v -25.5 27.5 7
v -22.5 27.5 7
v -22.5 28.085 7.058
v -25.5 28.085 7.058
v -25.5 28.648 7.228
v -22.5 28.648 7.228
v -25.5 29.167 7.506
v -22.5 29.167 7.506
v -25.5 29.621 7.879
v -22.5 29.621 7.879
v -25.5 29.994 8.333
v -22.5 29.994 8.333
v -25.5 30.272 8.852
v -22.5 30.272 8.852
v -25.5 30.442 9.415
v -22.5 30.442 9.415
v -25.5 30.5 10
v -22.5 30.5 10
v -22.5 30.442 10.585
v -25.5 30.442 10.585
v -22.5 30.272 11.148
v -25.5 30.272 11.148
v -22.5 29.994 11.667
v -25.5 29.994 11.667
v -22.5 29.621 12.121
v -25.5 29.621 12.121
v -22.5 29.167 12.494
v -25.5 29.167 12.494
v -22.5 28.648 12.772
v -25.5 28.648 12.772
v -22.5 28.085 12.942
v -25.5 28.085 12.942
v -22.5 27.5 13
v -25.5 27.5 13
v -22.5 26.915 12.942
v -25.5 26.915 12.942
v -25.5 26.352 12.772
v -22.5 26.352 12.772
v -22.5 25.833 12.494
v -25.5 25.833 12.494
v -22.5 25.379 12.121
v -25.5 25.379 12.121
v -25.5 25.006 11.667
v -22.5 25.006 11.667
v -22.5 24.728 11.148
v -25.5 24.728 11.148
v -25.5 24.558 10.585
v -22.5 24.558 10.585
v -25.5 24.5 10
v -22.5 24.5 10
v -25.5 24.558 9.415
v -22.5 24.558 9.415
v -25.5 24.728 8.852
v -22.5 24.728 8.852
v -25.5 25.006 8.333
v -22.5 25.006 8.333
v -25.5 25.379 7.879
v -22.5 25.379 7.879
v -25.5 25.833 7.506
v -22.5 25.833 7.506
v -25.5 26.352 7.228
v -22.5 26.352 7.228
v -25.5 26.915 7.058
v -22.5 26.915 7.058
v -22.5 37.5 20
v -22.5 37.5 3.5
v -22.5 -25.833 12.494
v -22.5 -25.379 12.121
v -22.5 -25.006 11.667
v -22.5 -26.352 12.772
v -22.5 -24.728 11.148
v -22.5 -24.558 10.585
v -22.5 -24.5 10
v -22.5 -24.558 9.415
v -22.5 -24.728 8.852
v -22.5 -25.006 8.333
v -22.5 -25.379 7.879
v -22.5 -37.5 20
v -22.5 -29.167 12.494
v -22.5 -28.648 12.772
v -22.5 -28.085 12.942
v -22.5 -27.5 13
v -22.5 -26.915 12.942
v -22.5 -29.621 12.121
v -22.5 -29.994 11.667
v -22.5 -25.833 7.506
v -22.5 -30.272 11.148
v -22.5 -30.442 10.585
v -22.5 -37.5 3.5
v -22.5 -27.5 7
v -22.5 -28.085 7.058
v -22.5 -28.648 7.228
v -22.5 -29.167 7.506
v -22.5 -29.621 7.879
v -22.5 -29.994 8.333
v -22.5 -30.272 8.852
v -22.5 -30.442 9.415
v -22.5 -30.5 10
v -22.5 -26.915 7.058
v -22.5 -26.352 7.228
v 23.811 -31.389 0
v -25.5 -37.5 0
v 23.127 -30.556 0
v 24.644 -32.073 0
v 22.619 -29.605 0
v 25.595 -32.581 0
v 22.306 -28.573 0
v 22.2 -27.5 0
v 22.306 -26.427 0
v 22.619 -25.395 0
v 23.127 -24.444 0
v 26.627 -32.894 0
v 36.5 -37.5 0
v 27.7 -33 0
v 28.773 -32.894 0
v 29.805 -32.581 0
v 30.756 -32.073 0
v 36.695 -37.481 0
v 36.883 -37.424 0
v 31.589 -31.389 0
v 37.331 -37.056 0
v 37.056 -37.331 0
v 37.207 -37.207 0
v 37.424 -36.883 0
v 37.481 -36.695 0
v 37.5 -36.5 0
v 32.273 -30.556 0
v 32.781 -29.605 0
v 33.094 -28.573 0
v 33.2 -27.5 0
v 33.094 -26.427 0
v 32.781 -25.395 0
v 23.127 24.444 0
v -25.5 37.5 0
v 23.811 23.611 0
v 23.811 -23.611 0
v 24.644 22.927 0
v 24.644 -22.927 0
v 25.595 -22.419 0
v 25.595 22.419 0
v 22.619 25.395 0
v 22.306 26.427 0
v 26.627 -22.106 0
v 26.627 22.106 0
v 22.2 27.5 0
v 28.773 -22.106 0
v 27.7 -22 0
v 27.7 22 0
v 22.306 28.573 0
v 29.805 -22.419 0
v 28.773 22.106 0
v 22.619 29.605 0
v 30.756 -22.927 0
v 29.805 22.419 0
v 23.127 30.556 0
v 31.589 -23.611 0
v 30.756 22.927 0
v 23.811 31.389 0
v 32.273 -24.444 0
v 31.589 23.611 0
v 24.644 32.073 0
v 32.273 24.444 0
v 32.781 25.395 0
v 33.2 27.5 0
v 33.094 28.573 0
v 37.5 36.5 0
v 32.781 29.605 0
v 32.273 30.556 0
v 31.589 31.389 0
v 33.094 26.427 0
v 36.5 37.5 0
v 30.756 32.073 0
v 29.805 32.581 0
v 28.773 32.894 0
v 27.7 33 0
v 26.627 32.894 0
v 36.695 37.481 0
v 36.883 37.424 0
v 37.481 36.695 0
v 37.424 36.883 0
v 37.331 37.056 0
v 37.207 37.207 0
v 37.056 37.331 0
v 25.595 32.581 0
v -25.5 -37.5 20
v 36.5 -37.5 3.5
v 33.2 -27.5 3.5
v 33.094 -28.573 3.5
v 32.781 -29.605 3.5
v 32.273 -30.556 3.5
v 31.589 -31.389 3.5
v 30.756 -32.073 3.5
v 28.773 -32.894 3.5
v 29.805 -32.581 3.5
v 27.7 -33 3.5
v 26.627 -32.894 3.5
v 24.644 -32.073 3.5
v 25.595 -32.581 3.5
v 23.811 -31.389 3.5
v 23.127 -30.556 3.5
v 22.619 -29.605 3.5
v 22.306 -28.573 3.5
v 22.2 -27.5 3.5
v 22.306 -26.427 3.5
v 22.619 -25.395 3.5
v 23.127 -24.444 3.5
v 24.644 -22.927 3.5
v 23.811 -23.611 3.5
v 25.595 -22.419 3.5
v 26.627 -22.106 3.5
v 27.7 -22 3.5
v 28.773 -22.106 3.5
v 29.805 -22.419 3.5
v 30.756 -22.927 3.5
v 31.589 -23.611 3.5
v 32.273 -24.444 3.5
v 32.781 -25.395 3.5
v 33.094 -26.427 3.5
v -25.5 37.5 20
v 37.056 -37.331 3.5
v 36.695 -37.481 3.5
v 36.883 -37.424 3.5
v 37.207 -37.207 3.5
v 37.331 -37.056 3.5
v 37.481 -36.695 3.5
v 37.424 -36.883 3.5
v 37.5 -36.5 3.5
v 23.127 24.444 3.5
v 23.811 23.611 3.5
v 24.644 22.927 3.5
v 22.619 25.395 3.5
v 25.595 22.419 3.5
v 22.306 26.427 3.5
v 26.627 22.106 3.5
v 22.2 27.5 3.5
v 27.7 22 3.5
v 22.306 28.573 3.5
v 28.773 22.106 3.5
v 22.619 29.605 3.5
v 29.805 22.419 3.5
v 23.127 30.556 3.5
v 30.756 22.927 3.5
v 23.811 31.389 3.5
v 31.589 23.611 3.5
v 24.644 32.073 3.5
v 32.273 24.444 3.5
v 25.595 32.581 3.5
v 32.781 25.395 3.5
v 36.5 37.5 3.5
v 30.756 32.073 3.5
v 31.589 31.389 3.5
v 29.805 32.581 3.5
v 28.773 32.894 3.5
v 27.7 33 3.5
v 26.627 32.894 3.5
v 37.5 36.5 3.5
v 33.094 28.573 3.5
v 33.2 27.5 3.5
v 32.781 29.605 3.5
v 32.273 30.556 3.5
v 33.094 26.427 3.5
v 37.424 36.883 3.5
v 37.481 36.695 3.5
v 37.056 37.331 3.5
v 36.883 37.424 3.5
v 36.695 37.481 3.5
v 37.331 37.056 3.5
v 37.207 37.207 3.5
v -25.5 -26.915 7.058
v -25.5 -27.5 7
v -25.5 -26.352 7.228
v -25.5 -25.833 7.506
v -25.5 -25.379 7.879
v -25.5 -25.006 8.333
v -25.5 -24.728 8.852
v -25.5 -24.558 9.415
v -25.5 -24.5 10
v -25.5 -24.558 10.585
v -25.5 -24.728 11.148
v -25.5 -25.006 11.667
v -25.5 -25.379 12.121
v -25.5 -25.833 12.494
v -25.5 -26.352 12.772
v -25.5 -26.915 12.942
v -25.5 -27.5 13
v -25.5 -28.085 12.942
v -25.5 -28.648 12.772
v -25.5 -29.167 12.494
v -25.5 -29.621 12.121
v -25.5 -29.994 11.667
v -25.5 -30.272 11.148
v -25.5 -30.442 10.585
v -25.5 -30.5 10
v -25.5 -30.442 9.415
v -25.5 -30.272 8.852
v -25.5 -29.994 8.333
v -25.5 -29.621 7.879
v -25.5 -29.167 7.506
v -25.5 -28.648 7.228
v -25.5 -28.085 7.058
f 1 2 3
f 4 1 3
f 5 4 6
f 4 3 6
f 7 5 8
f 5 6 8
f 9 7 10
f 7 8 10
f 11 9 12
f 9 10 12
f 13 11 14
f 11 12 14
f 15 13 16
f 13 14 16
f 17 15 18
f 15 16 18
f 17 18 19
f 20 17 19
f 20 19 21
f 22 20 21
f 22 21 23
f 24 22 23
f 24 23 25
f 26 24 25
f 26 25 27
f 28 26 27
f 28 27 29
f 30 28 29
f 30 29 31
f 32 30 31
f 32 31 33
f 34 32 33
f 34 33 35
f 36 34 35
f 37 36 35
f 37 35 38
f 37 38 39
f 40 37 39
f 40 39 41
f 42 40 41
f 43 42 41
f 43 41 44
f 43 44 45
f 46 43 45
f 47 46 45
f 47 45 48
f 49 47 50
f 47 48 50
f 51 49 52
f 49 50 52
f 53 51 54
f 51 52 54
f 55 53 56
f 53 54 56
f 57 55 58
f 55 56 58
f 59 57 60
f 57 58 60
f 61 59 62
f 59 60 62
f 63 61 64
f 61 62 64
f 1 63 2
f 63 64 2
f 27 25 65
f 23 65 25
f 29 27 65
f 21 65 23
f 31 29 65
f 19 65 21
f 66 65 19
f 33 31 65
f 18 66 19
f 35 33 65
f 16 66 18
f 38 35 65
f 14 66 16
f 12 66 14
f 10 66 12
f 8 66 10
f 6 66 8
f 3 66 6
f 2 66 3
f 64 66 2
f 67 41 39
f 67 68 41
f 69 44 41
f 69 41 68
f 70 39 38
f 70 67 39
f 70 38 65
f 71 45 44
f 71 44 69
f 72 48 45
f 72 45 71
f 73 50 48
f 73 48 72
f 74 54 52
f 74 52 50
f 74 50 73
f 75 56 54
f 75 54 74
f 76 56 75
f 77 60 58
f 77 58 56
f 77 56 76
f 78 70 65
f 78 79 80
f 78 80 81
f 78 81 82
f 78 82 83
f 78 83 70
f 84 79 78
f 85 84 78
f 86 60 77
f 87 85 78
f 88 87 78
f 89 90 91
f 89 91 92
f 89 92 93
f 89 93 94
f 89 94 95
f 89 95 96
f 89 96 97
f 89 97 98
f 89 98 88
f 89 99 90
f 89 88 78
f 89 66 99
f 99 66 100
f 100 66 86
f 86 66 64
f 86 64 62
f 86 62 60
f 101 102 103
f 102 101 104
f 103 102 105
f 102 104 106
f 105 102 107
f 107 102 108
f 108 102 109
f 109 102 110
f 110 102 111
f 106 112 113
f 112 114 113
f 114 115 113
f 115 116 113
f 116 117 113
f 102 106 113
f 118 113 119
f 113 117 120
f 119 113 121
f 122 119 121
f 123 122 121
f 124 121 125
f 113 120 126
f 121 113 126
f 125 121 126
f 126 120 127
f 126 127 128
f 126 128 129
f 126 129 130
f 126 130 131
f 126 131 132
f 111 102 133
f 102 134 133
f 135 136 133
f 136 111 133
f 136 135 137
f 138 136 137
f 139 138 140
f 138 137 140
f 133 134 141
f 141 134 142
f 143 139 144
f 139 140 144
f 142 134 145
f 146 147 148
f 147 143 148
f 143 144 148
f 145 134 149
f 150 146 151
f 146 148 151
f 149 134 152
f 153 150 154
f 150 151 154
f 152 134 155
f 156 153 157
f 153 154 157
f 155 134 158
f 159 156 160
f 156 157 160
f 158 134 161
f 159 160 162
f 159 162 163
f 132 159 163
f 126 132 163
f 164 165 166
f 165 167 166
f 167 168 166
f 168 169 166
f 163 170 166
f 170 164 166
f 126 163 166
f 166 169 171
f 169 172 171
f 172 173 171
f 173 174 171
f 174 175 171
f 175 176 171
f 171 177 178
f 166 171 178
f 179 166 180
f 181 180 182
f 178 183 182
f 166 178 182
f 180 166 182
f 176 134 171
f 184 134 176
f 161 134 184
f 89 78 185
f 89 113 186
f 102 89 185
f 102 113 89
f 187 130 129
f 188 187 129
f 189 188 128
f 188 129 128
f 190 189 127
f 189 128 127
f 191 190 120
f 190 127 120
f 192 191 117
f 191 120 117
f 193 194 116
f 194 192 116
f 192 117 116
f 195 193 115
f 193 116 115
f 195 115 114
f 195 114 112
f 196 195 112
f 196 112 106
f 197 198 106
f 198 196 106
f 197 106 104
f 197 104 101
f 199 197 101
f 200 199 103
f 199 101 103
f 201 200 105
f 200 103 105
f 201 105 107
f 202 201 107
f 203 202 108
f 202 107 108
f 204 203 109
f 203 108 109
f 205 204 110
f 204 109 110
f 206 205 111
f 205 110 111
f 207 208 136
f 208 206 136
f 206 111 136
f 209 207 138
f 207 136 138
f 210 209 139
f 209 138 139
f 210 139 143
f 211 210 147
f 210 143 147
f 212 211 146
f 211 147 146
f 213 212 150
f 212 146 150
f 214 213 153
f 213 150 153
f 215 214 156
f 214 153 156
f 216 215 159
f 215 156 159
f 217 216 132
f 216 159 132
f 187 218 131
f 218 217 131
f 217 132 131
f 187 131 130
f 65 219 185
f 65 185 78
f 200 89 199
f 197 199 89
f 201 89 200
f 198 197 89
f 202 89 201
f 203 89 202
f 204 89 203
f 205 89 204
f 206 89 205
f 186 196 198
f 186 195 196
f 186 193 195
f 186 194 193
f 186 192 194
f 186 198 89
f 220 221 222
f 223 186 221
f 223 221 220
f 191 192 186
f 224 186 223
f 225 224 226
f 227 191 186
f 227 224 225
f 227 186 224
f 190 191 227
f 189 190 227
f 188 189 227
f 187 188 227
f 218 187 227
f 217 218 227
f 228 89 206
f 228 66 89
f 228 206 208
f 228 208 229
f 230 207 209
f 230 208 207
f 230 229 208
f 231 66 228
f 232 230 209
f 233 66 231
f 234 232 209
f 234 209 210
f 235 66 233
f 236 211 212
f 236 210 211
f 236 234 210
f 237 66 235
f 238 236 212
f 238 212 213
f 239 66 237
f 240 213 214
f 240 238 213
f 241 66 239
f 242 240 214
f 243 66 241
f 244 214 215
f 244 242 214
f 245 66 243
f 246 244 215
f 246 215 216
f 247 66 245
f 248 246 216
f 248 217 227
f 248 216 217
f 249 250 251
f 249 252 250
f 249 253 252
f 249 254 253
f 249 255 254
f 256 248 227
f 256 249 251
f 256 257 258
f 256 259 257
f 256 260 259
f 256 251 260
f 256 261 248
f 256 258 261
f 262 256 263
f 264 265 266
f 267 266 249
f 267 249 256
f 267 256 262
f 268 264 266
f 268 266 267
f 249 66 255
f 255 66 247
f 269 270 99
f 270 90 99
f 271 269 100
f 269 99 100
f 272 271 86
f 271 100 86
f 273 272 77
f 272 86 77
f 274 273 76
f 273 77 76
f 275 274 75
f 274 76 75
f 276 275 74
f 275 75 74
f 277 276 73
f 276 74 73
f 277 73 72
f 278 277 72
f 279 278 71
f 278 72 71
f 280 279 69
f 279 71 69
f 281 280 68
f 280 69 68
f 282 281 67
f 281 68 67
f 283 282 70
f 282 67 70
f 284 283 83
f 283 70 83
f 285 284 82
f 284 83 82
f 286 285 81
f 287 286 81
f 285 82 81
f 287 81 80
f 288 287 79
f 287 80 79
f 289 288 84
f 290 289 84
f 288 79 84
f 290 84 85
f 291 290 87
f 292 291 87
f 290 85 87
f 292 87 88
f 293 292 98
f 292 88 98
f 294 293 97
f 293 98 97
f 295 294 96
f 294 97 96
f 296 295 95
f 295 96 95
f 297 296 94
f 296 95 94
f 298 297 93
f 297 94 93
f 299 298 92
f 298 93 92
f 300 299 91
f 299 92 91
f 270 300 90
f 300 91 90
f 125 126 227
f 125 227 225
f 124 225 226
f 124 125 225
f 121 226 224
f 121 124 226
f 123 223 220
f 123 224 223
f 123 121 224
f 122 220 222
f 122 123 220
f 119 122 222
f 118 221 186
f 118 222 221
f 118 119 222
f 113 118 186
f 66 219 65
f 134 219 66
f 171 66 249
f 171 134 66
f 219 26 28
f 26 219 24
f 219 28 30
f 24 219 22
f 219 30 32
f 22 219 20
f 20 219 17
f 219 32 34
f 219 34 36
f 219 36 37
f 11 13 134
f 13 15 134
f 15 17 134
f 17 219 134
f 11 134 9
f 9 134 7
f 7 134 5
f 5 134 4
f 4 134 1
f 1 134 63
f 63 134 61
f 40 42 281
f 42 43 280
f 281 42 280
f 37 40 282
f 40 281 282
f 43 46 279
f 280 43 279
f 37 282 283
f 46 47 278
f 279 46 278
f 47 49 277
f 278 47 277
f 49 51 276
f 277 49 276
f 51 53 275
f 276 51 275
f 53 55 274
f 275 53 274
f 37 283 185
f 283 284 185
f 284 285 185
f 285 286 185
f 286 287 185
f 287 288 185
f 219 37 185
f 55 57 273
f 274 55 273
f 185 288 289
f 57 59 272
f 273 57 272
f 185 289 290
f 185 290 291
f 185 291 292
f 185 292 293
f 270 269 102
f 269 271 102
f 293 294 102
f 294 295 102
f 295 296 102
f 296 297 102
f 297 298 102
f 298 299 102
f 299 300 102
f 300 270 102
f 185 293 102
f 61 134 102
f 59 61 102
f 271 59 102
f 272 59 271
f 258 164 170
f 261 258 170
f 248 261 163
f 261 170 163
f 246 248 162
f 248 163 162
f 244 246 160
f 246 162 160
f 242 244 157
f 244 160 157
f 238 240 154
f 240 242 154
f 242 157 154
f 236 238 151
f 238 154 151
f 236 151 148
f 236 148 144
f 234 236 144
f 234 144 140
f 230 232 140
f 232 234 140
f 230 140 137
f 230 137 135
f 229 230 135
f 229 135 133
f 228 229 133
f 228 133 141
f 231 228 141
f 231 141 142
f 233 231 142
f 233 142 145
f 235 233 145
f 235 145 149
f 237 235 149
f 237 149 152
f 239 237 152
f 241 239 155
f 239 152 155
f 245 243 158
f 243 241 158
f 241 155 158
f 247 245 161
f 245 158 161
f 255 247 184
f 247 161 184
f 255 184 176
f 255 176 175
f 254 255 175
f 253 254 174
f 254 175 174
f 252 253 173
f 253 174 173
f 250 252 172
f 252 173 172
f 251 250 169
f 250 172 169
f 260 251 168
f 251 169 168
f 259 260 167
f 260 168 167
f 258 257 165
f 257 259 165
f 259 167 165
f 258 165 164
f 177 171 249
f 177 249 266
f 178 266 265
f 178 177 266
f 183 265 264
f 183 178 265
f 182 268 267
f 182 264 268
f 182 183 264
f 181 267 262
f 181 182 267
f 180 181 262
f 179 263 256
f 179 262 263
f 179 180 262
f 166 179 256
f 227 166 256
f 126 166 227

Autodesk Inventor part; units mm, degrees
ref_plane "YZ Plane" through (0, 0, 0) normal (1, 0, 0) x (0, 1, 0)
ref_plane "XZ Plane" through (0, 0, 0) normal (0, 1, 0) x (-1, 0, 0)
ref_plane "Work Plane1" through (0, 0, 0) normal (0, 0, 1) x (1, 0, 0)
sketch "Sketch1" plane through (0, 0, 0) normal (0, 0, 1) x (1, 0, 0)
  line L0 (-36.5, 37.5) -> (36.5, 37.5)
  arc A0 (37.5, 36.5) -> (36.5, 37.5) centre (36.5, 36.5) ccw
  line L1 (37.5, 36.5) -> (37.5, -36.5)
  line L2 (36.5, -37.5) -> (-36.5, -37.5)
  arc A1 (36.5, -37.5) -> (37.5, -36.5) centre (36.5, -36.5) ccw
  line L3 (37.5, 37.5) -> (-25.4999, 37.5)
  line L4 (-25.4999, 37.5) -> (-25.4999, -37.5)
  line L5 (-25.4999, -37.5) -> (37.5, -37.5)
  line L6 (37.5, -37.5) -> (37.5, 37.5)
  circle A2 centre (27.7, 27.5) radius 5.5
  circle A3 centre (27.7, -27.5) radius 5.5
  point P0 (0, 0)
  point P1 (-25.4999, 37.5)
extrude "Extrusion1" add sketch "Sketch1" along normal blind 3.5 contours L0 A0 L1 A1 L2 L4
sketch "Sketch2" plane through (0, 0, 3.5) normal (0, 0, 1) x (1, 0, 0)
  line L0 (-25.4999, 37.5) -> (-25.4999, -37.5) projected
  line L1 (-25.4999, -37.5) -> (36.5, -37.5) projected
  line L2 (-25.4999, 37.5) -> (-22.4999, 37.5)
  line L3 (-22.4999, 37.5) -> (-22.4999, -37.5)
  line L4 (-22.4999, -37.5) -> (-25.4999, -37.5)
  line L5 (-25.4999, -37.5) -> (-25.4999, 37.5)
  point P0 (0, 0)
  dimension "d2" = 3
ref_plane "Work Plane2" through (-30.7961, -197.5, 20) normal (0, 0, 1) x (1, 0, 0)
extrude "Extrusion2" add sketch "Sketch2" along normal blind 16.5
sketch "Sketch3" plane through (-22.4999, -37.5, 3.5) normal (1, 0, 0) x (0, 0, -1)
  circle A0 centre (-6.5, 65) radius 3
  circle A1 centre (-6.5, 10) radius 3
  line L0 (-6.5, 10) -> (-6.5, 65)
  line L1 (0, 75) -> (-16.5, 75) projected
  line L2 (0, 0) -> (-16.5, 0) projected
  line L3 (-16.5, 0) -> (-16.5, 75) projected
  point P0 (3.5, 37.5)
  point P1 (-6.5, 37.5)
  dimension "d5" = 6
  dimension "d6" = 6
  dimension "d7" = 10
  dimension "d8" = 10
  dimension "d9" = 10
extrude "Extrusion3" cut sketch "Sketch3" against normal blind 16.5
properties part number "BackPistonSupport Top"
